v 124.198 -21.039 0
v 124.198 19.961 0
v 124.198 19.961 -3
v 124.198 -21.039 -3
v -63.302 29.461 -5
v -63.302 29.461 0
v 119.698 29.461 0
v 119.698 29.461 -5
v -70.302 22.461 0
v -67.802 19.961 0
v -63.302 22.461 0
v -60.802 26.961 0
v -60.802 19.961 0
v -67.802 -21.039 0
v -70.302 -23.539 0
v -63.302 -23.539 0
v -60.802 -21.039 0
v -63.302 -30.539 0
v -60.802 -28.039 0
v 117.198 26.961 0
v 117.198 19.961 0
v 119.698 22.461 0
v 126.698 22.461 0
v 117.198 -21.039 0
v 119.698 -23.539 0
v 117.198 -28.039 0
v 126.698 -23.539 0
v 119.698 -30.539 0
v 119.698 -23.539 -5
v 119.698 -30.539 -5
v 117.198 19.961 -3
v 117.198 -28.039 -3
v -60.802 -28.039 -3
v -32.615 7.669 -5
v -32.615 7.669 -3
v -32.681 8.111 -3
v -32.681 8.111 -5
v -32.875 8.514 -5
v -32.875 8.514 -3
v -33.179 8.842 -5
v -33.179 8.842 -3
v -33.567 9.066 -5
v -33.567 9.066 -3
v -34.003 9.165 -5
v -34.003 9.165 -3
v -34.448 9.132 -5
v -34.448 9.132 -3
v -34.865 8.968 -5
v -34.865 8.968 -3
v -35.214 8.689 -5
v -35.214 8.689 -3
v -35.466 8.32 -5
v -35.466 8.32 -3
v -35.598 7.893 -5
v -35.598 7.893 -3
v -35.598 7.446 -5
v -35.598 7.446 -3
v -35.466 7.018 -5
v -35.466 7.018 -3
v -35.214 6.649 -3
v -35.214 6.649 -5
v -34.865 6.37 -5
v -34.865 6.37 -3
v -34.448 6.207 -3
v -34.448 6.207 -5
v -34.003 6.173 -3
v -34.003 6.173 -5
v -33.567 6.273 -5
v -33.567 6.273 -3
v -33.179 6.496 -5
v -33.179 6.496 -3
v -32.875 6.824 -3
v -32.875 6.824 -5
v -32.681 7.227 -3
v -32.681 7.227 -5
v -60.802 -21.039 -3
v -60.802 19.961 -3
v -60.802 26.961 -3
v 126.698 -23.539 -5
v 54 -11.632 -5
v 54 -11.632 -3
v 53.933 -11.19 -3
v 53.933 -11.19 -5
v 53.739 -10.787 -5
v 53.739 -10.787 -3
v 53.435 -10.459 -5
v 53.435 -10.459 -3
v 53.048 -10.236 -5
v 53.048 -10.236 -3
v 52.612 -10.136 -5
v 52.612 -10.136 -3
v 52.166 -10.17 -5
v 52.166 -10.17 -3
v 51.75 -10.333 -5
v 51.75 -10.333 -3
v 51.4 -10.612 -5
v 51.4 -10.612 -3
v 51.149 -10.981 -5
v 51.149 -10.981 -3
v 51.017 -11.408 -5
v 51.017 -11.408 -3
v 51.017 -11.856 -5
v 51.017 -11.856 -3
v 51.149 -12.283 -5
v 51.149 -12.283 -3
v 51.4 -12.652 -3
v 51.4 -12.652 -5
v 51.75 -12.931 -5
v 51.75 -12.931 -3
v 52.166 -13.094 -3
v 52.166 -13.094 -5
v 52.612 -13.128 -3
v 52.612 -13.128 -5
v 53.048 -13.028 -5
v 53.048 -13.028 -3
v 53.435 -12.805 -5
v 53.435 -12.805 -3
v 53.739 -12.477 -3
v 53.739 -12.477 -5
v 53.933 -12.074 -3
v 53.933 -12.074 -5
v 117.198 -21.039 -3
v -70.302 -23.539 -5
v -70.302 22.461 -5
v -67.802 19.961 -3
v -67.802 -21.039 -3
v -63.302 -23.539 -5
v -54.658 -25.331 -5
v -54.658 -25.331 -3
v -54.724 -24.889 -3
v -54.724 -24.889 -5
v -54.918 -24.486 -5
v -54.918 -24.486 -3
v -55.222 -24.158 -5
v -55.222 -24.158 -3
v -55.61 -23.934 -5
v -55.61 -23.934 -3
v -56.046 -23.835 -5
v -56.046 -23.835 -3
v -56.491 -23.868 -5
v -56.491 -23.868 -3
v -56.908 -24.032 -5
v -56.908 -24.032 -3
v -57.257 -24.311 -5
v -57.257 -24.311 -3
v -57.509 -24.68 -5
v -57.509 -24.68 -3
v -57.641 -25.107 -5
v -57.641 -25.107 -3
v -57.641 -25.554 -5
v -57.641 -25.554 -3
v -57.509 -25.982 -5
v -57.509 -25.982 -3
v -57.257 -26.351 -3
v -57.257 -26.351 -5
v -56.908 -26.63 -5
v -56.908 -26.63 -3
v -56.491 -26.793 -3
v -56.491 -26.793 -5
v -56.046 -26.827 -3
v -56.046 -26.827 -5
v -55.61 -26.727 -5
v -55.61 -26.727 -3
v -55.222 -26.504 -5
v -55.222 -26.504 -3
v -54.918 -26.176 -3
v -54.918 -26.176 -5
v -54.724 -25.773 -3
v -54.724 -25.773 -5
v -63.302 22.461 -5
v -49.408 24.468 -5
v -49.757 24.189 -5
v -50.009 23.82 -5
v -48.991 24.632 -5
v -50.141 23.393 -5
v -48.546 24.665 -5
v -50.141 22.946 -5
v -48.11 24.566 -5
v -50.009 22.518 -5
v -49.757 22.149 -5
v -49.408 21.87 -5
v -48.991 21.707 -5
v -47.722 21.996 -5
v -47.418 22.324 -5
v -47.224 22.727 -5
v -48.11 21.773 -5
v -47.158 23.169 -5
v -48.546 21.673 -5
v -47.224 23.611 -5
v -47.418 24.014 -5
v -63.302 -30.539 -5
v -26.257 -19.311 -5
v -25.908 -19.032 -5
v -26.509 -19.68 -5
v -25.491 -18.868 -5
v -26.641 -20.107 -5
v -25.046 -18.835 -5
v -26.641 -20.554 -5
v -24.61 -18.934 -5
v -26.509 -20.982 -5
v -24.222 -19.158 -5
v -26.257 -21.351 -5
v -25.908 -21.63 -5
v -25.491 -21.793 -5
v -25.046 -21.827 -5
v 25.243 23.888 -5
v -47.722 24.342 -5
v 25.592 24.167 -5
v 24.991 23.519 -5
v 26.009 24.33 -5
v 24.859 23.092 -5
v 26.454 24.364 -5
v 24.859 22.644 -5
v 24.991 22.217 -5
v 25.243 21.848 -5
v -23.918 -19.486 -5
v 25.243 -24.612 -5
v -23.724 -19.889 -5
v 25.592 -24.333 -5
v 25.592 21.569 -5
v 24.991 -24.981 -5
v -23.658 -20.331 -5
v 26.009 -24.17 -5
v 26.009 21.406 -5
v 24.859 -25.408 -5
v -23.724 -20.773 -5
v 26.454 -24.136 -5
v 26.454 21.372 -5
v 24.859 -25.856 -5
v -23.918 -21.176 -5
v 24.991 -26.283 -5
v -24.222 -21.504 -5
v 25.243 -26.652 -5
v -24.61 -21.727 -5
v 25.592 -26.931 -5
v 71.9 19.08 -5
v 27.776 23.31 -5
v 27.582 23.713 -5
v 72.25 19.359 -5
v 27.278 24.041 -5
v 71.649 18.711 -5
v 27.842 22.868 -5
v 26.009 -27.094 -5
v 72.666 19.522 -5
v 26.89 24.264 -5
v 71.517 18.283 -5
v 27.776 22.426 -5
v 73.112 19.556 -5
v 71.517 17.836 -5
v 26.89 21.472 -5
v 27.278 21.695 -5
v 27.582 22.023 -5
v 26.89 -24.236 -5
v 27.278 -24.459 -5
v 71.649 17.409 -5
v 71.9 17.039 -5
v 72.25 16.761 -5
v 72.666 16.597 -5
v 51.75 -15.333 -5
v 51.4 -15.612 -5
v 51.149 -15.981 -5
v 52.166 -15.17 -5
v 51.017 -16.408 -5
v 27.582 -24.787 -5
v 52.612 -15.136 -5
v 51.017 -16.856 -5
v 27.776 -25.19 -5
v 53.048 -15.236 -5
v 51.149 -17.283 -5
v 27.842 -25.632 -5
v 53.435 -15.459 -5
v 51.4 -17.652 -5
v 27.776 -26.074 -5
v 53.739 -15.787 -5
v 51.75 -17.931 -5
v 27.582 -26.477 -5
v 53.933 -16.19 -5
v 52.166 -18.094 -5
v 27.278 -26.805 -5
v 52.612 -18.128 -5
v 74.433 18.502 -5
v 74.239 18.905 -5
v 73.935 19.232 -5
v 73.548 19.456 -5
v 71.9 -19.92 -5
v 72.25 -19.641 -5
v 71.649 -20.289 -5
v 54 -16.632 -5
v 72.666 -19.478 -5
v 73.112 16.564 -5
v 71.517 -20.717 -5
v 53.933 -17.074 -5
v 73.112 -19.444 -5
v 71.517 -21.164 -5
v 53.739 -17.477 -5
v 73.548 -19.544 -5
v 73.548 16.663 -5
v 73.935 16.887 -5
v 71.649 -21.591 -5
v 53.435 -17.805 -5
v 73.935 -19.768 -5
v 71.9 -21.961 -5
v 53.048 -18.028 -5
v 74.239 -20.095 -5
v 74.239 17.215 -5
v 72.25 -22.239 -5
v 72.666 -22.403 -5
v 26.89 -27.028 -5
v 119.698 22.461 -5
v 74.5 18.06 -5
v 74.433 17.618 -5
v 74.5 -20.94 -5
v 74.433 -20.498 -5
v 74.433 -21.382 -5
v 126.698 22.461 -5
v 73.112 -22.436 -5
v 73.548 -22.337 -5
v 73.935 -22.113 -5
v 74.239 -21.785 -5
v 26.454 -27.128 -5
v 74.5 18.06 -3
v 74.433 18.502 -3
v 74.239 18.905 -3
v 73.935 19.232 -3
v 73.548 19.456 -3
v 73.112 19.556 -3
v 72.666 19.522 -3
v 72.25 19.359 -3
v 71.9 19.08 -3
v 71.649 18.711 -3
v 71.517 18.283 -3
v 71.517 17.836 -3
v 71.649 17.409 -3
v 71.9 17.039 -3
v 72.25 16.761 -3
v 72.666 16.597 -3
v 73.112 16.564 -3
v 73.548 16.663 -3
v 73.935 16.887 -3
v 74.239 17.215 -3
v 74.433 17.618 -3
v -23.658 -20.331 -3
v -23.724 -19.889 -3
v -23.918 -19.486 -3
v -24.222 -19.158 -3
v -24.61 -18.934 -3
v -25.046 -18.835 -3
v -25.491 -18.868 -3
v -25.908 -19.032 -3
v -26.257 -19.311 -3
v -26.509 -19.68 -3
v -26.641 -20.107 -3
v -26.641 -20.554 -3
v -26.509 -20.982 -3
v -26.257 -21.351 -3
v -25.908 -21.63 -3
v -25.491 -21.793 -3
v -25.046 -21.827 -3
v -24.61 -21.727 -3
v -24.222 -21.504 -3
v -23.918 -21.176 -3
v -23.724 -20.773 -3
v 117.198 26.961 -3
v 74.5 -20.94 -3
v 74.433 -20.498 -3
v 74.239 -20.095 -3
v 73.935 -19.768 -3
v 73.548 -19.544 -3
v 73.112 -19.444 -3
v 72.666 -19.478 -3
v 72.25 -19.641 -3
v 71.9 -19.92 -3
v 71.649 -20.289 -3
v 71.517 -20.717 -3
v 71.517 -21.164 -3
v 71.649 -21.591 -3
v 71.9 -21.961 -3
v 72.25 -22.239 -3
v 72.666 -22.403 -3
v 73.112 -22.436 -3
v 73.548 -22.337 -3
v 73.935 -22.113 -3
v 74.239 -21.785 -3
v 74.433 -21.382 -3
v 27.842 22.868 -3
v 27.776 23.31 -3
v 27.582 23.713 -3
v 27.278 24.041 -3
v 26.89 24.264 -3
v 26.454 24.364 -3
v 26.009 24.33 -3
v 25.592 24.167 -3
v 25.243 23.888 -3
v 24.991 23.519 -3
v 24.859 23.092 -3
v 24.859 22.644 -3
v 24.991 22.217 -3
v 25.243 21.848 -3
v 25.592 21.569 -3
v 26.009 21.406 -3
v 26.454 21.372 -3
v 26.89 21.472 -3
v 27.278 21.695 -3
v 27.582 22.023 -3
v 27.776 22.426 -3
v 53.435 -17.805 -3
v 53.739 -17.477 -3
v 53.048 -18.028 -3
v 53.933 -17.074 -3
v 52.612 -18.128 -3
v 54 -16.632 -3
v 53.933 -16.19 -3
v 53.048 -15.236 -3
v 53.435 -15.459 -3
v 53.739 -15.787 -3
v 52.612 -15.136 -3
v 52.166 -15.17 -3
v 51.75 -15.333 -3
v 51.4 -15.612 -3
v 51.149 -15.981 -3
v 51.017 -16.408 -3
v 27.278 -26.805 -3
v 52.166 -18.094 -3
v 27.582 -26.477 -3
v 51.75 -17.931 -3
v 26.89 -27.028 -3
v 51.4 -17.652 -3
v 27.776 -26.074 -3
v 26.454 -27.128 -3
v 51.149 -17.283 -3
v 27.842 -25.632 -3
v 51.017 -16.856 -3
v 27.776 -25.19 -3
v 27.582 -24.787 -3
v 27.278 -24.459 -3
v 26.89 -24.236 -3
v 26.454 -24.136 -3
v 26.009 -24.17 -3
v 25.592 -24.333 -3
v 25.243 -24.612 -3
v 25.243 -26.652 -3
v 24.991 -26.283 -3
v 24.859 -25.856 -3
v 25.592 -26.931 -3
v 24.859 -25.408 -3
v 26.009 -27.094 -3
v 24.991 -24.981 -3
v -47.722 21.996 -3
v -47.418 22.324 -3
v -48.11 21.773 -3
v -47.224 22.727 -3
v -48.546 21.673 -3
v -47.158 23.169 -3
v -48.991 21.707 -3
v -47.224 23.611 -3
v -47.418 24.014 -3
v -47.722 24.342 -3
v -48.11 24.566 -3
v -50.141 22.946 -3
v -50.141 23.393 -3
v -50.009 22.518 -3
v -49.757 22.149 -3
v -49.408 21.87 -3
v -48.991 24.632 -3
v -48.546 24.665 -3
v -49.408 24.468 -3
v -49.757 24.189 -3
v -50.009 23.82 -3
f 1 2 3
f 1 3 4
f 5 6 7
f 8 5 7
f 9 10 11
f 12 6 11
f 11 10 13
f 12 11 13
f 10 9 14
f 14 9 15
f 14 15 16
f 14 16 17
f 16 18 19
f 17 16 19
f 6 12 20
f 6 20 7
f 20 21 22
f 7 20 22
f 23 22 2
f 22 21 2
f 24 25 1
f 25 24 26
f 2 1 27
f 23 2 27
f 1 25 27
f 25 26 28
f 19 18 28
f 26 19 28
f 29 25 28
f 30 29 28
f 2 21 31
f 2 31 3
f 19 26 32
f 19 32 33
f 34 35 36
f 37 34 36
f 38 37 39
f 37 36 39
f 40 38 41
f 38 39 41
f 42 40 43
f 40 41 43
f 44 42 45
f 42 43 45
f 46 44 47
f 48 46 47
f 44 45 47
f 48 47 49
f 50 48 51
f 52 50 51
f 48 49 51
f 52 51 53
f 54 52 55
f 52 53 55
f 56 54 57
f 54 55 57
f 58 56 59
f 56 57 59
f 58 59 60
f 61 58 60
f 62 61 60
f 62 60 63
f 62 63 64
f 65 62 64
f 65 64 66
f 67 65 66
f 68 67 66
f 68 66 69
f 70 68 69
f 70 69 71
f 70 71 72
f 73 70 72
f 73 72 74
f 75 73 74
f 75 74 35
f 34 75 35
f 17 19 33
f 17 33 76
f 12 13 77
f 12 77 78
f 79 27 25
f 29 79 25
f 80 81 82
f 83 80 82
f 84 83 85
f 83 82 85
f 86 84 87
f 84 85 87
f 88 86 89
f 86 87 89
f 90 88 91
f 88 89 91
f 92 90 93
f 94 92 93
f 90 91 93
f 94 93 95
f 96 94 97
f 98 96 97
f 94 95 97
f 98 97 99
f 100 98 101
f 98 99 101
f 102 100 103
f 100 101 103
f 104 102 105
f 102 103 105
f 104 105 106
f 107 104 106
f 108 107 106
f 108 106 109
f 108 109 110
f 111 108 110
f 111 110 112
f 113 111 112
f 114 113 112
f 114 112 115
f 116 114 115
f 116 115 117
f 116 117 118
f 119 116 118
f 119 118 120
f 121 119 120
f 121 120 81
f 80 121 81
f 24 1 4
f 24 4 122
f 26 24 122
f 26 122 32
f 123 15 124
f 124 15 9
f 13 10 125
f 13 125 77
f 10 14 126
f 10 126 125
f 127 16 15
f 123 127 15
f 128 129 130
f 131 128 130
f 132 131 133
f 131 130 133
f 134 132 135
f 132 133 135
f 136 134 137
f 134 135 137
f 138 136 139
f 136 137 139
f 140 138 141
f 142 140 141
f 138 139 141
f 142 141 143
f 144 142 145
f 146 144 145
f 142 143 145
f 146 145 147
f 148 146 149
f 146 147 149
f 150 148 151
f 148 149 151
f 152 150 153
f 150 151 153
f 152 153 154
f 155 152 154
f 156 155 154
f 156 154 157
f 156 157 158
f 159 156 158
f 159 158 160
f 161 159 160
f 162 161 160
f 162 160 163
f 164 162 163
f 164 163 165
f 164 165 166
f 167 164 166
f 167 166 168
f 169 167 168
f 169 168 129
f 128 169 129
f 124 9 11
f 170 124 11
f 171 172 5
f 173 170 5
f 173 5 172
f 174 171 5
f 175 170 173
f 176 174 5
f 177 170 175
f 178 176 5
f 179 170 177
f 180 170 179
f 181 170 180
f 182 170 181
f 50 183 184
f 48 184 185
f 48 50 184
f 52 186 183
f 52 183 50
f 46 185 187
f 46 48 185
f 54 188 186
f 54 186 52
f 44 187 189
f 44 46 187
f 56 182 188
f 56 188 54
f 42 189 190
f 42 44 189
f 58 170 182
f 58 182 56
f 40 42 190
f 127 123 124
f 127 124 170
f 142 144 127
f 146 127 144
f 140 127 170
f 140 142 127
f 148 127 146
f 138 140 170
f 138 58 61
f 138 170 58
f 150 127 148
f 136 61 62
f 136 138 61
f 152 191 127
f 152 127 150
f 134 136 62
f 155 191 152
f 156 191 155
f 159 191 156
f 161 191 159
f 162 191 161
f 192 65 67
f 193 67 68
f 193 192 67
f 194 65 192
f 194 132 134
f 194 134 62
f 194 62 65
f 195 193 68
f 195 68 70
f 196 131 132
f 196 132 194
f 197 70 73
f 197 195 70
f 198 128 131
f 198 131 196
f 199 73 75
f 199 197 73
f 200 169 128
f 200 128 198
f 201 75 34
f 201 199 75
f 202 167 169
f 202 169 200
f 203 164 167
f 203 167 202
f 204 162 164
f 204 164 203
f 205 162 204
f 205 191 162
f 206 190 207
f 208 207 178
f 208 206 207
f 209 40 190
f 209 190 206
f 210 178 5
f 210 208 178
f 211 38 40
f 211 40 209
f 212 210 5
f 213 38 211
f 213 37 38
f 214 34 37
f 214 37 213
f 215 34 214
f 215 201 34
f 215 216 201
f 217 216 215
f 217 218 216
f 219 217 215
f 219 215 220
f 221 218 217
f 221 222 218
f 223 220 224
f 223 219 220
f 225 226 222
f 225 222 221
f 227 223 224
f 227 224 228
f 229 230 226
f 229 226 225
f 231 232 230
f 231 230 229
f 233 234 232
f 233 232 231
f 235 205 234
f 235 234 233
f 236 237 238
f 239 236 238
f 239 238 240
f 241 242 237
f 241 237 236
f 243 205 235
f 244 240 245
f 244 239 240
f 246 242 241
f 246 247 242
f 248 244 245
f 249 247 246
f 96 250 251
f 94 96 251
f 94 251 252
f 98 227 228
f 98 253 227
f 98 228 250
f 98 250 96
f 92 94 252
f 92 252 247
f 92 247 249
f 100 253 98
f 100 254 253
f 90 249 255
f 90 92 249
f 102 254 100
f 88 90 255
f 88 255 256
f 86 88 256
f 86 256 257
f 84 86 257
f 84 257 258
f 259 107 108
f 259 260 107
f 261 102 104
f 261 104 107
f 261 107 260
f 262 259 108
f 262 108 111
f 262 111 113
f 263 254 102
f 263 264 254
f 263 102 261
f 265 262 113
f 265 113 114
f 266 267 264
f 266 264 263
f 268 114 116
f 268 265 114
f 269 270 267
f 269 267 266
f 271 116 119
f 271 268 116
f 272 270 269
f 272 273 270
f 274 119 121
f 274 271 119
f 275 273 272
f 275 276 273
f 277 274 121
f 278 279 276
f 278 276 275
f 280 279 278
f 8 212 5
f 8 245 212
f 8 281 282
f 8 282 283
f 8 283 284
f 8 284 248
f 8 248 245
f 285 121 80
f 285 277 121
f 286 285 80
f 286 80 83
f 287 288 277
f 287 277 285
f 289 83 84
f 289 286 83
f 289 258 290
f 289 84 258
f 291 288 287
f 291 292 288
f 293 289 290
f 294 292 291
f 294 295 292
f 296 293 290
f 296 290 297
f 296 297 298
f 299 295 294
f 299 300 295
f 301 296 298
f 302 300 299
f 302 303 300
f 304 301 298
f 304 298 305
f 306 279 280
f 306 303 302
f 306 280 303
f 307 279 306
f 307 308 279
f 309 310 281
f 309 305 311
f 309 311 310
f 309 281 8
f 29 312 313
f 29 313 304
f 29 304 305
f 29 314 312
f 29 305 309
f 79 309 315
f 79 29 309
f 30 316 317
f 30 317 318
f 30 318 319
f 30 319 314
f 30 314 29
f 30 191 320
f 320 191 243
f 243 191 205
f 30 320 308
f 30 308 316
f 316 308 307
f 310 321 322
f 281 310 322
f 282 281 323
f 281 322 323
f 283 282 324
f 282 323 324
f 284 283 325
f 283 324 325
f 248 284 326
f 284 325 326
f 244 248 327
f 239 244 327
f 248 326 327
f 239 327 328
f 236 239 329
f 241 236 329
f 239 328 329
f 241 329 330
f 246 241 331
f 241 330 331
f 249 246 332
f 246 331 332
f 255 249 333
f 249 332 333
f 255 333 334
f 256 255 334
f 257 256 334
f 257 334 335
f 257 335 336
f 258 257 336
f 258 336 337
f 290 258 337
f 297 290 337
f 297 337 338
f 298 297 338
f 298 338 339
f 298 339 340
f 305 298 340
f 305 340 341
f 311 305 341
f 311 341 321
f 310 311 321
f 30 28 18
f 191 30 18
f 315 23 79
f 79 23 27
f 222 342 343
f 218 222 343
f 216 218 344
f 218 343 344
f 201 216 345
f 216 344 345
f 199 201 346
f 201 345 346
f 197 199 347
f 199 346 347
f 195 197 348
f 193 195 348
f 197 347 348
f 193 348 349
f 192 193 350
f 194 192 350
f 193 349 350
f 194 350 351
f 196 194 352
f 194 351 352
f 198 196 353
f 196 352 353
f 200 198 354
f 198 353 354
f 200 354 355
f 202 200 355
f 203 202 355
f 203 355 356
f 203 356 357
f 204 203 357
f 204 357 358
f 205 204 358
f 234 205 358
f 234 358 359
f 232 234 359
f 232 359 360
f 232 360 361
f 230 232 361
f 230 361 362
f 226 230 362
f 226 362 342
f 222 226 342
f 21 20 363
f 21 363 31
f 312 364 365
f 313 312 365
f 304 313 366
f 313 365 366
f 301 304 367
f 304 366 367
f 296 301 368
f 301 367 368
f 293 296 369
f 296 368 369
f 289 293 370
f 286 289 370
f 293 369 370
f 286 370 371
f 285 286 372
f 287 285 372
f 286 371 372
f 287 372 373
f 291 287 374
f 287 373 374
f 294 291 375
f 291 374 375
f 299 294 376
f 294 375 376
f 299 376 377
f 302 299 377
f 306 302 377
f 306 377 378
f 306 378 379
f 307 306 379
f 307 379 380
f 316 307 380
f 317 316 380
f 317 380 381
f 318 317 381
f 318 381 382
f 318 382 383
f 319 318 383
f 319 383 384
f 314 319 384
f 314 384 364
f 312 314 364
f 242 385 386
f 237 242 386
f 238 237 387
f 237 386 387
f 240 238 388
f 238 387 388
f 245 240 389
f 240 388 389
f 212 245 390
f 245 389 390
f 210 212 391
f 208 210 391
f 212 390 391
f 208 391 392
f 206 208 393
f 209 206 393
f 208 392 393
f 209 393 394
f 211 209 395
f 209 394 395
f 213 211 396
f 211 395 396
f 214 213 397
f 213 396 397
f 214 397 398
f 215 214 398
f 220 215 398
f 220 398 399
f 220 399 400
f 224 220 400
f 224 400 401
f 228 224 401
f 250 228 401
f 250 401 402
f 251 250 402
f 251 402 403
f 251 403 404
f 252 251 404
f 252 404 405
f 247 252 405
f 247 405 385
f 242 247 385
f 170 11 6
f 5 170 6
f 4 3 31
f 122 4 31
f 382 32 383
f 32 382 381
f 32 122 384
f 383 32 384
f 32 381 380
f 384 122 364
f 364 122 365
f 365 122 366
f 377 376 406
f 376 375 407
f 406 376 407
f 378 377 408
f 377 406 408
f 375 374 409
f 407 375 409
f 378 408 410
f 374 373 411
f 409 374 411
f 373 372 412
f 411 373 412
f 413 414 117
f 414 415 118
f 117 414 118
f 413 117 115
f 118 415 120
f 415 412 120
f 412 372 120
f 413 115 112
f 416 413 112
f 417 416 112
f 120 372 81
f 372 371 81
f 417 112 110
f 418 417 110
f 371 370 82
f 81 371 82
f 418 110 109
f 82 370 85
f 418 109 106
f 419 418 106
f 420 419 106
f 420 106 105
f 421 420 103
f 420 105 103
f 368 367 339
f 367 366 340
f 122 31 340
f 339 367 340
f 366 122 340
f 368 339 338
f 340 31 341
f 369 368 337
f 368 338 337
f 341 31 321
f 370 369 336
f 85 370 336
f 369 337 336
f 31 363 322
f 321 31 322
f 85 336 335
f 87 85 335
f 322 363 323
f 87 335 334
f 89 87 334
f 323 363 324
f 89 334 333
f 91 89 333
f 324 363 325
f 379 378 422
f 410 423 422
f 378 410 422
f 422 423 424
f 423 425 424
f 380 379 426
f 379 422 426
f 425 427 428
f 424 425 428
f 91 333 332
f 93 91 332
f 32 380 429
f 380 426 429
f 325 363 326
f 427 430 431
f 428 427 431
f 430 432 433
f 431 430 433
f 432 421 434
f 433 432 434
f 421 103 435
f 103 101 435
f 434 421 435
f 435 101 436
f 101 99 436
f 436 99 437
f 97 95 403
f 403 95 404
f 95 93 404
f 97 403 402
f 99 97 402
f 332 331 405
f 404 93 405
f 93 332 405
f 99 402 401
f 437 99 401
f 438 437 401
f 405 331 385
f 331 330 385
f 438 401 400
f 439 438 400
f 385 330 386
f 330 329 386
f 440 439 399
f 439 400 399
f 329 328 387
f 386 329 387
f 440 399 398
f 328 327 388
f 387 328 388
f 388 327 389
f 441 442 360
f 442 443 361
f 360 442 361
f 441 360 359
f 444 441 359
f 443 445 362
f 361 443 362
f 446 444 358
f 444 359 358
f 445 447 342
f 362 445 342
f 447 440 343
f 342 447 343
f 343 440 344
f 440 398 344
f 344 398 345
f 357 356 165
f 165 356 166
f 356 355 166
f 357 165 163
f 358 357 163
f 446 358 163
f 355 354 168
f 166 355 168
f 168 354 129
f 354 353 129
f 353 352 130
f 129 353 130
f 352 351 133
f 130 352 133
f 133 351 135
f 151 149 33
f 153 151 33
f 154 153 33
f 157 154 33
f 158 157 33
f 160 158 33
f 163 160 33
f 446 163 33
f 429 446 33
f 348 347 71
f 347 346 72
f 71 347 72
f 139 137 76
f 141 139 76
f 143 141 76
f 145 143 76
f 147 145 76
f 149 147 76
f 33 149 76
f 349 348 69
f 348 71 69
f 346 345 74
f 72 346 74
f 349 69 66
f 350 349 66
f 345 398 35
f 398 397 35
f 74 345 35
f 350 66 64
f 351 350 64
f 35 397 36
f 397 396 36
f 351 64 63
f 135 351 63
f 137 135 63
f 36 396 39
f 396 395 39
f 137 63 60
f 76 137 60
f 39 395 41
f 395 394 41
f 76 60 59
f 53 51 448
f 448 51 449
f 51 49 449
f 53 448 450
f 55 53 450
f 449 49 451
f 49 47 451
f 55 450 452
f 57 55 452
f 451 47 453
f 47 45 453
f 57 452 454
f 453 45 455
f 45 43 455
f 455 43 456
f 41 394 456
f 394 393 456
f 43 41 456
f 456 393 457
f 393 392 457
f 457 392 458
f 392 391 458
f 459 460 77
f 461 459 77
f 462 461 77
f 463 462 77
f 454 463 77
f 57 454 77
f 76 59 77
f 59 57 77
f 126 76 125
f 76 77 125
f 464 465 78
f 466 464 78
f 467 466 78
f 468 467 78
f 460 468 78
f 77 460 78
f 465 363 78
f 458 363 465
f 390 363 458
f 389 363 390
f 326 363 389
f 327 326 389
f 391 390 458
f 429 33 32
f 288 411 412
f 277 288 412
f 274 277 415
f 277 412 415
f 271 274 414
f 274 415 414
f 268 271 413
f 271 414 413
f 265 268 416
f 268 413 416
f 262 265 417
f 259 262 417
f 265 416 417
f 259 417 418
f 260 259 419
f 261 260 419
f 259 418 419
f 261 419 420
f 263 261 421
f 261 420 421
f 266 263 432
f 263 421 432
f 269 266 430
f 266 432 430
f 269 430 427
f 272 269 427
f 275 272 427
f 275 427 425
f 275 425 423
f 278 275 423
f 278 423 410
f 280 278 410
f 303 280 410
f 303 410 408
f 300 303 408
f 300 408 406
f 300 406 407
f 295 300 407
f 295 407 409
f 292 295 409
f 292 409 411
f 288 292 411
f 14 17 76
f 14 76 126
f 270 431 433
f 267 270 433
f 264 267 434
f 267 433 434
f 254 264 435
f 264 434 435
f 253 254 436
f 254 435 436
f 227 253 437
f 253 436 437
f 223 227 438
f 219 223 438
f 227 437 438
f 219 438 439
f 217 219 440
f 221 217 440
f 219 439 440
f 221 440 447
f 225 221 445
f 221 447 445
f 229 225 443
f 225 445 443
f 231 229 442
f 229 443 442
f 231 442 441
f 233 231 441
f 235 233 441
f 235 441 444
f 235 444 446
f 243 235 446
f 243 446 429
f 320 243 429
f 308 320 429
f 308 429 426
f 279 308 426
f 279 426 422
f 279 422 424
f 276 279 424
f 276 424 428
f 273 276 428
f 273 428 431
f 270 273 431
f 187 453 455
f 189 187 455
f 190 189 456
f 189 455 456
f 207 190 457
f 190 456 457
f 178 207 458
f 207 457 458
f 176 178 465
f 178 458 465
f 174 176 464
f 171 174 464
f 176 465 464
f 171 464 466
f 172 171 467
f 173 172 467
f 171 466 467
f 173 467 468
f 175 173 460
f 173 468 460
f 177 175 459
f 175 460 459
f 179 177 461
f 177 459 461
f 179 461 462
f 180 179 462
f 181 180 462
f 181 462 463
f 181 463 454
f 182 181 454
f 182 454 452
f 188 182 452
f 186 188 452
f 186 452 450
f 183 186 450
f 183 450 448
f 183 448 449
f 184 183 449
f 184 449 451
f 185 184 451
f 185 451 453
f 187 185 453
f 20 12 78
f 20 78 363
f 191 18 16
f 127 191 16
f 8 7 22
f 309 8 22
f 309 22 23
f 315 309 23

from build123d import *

# Parameters (mm, degrees)
PAD_DEPTH       = 5
POCKET003_DEPTH = 3
SKETCH011_R     = 1.5
POCKET004_DEPTH = 10


with BuildPart() as part:
    # Sketch009 (on Face5 of Pad002) → Pad (new body)
    with BuildSketch(Plane(origin=(0, 0, 0), x_dir=(1, 0, 0), z_dir=(0, 0, -1))):
        Polygon((-63.30204, 23.538714), (-70.30204, 23.538714), (-70.30204, -22.461286), (-63.30204, -22.461286), (-63.30204, -29.461286), (119.69796, -29.461286), (119.69796, -22.461286), (126.69796, -22.461286), (126.69796, 23.538714), (119.69796, 23.538714), (119.69796, 30.538714), (-63.30204, 30.538714), align=None)
    extrude(amount=PAD_DEPTH)

    # Sketch010 (on Face13 of Pad) → Pocket003 (cut)
    with BuildSketch(Plane.XY):
        Polygon((-60.80204, -28.038714), (-60.80204, -21.038714), (-67.80204, -21.038714), (-67.80204, 19.961286), (-60.80204, 19.961286), (-60.80204, 26.961286), (117.19796, 26.961286), (117.19796, 19.961286), (124.19796, 19.961286), (124.19796, -21.038714), (117.19796, -21.038714), (117.19796, -28.038714), align=None)
    extrude(amount=-POCKET003_DEPTH, mode=Mode.SUBTRACT)

    # Sketch011 (on Face27 of Pocket003) → Pocket004 (cut)
    with BuildSketch(Plane.XY.offset(-3)):
        with Locations((-48.657681, 23.169219)):
            Circle(SKETCH011_R)
        with Locations((-34.114651, 7.669219)):
            Circle(SKETCH011_R)
        with Locations((26.342319, 22.86806)):
            Circle(SKETCH011_R)
        with Locations((-25.157681, -20.330781)):
            Circle(SKETCH011_R)
        with Locations((-56.157681, -25.330781)):
            Circle(SKETCH011_R)
        with Locations((26.342319, -25.63194)):
            Circle(SKETCH011_R)
        with Locations((52.5, -11.63194)):
            Circle(SKETCH011_R)
        with Locations((52.5, -16.63194)):
            Circle(SKETCH011_R)
        with Locations((73, 18.059744)):
            Circle(SKETCH011_R)
        with Locations((73, -20.940256)):
            Circle(SKETCH011_R)
    extrude(amount=-POCKET004_DEPTH, mode=Mode.SUBTRACT)


solid = part.part
